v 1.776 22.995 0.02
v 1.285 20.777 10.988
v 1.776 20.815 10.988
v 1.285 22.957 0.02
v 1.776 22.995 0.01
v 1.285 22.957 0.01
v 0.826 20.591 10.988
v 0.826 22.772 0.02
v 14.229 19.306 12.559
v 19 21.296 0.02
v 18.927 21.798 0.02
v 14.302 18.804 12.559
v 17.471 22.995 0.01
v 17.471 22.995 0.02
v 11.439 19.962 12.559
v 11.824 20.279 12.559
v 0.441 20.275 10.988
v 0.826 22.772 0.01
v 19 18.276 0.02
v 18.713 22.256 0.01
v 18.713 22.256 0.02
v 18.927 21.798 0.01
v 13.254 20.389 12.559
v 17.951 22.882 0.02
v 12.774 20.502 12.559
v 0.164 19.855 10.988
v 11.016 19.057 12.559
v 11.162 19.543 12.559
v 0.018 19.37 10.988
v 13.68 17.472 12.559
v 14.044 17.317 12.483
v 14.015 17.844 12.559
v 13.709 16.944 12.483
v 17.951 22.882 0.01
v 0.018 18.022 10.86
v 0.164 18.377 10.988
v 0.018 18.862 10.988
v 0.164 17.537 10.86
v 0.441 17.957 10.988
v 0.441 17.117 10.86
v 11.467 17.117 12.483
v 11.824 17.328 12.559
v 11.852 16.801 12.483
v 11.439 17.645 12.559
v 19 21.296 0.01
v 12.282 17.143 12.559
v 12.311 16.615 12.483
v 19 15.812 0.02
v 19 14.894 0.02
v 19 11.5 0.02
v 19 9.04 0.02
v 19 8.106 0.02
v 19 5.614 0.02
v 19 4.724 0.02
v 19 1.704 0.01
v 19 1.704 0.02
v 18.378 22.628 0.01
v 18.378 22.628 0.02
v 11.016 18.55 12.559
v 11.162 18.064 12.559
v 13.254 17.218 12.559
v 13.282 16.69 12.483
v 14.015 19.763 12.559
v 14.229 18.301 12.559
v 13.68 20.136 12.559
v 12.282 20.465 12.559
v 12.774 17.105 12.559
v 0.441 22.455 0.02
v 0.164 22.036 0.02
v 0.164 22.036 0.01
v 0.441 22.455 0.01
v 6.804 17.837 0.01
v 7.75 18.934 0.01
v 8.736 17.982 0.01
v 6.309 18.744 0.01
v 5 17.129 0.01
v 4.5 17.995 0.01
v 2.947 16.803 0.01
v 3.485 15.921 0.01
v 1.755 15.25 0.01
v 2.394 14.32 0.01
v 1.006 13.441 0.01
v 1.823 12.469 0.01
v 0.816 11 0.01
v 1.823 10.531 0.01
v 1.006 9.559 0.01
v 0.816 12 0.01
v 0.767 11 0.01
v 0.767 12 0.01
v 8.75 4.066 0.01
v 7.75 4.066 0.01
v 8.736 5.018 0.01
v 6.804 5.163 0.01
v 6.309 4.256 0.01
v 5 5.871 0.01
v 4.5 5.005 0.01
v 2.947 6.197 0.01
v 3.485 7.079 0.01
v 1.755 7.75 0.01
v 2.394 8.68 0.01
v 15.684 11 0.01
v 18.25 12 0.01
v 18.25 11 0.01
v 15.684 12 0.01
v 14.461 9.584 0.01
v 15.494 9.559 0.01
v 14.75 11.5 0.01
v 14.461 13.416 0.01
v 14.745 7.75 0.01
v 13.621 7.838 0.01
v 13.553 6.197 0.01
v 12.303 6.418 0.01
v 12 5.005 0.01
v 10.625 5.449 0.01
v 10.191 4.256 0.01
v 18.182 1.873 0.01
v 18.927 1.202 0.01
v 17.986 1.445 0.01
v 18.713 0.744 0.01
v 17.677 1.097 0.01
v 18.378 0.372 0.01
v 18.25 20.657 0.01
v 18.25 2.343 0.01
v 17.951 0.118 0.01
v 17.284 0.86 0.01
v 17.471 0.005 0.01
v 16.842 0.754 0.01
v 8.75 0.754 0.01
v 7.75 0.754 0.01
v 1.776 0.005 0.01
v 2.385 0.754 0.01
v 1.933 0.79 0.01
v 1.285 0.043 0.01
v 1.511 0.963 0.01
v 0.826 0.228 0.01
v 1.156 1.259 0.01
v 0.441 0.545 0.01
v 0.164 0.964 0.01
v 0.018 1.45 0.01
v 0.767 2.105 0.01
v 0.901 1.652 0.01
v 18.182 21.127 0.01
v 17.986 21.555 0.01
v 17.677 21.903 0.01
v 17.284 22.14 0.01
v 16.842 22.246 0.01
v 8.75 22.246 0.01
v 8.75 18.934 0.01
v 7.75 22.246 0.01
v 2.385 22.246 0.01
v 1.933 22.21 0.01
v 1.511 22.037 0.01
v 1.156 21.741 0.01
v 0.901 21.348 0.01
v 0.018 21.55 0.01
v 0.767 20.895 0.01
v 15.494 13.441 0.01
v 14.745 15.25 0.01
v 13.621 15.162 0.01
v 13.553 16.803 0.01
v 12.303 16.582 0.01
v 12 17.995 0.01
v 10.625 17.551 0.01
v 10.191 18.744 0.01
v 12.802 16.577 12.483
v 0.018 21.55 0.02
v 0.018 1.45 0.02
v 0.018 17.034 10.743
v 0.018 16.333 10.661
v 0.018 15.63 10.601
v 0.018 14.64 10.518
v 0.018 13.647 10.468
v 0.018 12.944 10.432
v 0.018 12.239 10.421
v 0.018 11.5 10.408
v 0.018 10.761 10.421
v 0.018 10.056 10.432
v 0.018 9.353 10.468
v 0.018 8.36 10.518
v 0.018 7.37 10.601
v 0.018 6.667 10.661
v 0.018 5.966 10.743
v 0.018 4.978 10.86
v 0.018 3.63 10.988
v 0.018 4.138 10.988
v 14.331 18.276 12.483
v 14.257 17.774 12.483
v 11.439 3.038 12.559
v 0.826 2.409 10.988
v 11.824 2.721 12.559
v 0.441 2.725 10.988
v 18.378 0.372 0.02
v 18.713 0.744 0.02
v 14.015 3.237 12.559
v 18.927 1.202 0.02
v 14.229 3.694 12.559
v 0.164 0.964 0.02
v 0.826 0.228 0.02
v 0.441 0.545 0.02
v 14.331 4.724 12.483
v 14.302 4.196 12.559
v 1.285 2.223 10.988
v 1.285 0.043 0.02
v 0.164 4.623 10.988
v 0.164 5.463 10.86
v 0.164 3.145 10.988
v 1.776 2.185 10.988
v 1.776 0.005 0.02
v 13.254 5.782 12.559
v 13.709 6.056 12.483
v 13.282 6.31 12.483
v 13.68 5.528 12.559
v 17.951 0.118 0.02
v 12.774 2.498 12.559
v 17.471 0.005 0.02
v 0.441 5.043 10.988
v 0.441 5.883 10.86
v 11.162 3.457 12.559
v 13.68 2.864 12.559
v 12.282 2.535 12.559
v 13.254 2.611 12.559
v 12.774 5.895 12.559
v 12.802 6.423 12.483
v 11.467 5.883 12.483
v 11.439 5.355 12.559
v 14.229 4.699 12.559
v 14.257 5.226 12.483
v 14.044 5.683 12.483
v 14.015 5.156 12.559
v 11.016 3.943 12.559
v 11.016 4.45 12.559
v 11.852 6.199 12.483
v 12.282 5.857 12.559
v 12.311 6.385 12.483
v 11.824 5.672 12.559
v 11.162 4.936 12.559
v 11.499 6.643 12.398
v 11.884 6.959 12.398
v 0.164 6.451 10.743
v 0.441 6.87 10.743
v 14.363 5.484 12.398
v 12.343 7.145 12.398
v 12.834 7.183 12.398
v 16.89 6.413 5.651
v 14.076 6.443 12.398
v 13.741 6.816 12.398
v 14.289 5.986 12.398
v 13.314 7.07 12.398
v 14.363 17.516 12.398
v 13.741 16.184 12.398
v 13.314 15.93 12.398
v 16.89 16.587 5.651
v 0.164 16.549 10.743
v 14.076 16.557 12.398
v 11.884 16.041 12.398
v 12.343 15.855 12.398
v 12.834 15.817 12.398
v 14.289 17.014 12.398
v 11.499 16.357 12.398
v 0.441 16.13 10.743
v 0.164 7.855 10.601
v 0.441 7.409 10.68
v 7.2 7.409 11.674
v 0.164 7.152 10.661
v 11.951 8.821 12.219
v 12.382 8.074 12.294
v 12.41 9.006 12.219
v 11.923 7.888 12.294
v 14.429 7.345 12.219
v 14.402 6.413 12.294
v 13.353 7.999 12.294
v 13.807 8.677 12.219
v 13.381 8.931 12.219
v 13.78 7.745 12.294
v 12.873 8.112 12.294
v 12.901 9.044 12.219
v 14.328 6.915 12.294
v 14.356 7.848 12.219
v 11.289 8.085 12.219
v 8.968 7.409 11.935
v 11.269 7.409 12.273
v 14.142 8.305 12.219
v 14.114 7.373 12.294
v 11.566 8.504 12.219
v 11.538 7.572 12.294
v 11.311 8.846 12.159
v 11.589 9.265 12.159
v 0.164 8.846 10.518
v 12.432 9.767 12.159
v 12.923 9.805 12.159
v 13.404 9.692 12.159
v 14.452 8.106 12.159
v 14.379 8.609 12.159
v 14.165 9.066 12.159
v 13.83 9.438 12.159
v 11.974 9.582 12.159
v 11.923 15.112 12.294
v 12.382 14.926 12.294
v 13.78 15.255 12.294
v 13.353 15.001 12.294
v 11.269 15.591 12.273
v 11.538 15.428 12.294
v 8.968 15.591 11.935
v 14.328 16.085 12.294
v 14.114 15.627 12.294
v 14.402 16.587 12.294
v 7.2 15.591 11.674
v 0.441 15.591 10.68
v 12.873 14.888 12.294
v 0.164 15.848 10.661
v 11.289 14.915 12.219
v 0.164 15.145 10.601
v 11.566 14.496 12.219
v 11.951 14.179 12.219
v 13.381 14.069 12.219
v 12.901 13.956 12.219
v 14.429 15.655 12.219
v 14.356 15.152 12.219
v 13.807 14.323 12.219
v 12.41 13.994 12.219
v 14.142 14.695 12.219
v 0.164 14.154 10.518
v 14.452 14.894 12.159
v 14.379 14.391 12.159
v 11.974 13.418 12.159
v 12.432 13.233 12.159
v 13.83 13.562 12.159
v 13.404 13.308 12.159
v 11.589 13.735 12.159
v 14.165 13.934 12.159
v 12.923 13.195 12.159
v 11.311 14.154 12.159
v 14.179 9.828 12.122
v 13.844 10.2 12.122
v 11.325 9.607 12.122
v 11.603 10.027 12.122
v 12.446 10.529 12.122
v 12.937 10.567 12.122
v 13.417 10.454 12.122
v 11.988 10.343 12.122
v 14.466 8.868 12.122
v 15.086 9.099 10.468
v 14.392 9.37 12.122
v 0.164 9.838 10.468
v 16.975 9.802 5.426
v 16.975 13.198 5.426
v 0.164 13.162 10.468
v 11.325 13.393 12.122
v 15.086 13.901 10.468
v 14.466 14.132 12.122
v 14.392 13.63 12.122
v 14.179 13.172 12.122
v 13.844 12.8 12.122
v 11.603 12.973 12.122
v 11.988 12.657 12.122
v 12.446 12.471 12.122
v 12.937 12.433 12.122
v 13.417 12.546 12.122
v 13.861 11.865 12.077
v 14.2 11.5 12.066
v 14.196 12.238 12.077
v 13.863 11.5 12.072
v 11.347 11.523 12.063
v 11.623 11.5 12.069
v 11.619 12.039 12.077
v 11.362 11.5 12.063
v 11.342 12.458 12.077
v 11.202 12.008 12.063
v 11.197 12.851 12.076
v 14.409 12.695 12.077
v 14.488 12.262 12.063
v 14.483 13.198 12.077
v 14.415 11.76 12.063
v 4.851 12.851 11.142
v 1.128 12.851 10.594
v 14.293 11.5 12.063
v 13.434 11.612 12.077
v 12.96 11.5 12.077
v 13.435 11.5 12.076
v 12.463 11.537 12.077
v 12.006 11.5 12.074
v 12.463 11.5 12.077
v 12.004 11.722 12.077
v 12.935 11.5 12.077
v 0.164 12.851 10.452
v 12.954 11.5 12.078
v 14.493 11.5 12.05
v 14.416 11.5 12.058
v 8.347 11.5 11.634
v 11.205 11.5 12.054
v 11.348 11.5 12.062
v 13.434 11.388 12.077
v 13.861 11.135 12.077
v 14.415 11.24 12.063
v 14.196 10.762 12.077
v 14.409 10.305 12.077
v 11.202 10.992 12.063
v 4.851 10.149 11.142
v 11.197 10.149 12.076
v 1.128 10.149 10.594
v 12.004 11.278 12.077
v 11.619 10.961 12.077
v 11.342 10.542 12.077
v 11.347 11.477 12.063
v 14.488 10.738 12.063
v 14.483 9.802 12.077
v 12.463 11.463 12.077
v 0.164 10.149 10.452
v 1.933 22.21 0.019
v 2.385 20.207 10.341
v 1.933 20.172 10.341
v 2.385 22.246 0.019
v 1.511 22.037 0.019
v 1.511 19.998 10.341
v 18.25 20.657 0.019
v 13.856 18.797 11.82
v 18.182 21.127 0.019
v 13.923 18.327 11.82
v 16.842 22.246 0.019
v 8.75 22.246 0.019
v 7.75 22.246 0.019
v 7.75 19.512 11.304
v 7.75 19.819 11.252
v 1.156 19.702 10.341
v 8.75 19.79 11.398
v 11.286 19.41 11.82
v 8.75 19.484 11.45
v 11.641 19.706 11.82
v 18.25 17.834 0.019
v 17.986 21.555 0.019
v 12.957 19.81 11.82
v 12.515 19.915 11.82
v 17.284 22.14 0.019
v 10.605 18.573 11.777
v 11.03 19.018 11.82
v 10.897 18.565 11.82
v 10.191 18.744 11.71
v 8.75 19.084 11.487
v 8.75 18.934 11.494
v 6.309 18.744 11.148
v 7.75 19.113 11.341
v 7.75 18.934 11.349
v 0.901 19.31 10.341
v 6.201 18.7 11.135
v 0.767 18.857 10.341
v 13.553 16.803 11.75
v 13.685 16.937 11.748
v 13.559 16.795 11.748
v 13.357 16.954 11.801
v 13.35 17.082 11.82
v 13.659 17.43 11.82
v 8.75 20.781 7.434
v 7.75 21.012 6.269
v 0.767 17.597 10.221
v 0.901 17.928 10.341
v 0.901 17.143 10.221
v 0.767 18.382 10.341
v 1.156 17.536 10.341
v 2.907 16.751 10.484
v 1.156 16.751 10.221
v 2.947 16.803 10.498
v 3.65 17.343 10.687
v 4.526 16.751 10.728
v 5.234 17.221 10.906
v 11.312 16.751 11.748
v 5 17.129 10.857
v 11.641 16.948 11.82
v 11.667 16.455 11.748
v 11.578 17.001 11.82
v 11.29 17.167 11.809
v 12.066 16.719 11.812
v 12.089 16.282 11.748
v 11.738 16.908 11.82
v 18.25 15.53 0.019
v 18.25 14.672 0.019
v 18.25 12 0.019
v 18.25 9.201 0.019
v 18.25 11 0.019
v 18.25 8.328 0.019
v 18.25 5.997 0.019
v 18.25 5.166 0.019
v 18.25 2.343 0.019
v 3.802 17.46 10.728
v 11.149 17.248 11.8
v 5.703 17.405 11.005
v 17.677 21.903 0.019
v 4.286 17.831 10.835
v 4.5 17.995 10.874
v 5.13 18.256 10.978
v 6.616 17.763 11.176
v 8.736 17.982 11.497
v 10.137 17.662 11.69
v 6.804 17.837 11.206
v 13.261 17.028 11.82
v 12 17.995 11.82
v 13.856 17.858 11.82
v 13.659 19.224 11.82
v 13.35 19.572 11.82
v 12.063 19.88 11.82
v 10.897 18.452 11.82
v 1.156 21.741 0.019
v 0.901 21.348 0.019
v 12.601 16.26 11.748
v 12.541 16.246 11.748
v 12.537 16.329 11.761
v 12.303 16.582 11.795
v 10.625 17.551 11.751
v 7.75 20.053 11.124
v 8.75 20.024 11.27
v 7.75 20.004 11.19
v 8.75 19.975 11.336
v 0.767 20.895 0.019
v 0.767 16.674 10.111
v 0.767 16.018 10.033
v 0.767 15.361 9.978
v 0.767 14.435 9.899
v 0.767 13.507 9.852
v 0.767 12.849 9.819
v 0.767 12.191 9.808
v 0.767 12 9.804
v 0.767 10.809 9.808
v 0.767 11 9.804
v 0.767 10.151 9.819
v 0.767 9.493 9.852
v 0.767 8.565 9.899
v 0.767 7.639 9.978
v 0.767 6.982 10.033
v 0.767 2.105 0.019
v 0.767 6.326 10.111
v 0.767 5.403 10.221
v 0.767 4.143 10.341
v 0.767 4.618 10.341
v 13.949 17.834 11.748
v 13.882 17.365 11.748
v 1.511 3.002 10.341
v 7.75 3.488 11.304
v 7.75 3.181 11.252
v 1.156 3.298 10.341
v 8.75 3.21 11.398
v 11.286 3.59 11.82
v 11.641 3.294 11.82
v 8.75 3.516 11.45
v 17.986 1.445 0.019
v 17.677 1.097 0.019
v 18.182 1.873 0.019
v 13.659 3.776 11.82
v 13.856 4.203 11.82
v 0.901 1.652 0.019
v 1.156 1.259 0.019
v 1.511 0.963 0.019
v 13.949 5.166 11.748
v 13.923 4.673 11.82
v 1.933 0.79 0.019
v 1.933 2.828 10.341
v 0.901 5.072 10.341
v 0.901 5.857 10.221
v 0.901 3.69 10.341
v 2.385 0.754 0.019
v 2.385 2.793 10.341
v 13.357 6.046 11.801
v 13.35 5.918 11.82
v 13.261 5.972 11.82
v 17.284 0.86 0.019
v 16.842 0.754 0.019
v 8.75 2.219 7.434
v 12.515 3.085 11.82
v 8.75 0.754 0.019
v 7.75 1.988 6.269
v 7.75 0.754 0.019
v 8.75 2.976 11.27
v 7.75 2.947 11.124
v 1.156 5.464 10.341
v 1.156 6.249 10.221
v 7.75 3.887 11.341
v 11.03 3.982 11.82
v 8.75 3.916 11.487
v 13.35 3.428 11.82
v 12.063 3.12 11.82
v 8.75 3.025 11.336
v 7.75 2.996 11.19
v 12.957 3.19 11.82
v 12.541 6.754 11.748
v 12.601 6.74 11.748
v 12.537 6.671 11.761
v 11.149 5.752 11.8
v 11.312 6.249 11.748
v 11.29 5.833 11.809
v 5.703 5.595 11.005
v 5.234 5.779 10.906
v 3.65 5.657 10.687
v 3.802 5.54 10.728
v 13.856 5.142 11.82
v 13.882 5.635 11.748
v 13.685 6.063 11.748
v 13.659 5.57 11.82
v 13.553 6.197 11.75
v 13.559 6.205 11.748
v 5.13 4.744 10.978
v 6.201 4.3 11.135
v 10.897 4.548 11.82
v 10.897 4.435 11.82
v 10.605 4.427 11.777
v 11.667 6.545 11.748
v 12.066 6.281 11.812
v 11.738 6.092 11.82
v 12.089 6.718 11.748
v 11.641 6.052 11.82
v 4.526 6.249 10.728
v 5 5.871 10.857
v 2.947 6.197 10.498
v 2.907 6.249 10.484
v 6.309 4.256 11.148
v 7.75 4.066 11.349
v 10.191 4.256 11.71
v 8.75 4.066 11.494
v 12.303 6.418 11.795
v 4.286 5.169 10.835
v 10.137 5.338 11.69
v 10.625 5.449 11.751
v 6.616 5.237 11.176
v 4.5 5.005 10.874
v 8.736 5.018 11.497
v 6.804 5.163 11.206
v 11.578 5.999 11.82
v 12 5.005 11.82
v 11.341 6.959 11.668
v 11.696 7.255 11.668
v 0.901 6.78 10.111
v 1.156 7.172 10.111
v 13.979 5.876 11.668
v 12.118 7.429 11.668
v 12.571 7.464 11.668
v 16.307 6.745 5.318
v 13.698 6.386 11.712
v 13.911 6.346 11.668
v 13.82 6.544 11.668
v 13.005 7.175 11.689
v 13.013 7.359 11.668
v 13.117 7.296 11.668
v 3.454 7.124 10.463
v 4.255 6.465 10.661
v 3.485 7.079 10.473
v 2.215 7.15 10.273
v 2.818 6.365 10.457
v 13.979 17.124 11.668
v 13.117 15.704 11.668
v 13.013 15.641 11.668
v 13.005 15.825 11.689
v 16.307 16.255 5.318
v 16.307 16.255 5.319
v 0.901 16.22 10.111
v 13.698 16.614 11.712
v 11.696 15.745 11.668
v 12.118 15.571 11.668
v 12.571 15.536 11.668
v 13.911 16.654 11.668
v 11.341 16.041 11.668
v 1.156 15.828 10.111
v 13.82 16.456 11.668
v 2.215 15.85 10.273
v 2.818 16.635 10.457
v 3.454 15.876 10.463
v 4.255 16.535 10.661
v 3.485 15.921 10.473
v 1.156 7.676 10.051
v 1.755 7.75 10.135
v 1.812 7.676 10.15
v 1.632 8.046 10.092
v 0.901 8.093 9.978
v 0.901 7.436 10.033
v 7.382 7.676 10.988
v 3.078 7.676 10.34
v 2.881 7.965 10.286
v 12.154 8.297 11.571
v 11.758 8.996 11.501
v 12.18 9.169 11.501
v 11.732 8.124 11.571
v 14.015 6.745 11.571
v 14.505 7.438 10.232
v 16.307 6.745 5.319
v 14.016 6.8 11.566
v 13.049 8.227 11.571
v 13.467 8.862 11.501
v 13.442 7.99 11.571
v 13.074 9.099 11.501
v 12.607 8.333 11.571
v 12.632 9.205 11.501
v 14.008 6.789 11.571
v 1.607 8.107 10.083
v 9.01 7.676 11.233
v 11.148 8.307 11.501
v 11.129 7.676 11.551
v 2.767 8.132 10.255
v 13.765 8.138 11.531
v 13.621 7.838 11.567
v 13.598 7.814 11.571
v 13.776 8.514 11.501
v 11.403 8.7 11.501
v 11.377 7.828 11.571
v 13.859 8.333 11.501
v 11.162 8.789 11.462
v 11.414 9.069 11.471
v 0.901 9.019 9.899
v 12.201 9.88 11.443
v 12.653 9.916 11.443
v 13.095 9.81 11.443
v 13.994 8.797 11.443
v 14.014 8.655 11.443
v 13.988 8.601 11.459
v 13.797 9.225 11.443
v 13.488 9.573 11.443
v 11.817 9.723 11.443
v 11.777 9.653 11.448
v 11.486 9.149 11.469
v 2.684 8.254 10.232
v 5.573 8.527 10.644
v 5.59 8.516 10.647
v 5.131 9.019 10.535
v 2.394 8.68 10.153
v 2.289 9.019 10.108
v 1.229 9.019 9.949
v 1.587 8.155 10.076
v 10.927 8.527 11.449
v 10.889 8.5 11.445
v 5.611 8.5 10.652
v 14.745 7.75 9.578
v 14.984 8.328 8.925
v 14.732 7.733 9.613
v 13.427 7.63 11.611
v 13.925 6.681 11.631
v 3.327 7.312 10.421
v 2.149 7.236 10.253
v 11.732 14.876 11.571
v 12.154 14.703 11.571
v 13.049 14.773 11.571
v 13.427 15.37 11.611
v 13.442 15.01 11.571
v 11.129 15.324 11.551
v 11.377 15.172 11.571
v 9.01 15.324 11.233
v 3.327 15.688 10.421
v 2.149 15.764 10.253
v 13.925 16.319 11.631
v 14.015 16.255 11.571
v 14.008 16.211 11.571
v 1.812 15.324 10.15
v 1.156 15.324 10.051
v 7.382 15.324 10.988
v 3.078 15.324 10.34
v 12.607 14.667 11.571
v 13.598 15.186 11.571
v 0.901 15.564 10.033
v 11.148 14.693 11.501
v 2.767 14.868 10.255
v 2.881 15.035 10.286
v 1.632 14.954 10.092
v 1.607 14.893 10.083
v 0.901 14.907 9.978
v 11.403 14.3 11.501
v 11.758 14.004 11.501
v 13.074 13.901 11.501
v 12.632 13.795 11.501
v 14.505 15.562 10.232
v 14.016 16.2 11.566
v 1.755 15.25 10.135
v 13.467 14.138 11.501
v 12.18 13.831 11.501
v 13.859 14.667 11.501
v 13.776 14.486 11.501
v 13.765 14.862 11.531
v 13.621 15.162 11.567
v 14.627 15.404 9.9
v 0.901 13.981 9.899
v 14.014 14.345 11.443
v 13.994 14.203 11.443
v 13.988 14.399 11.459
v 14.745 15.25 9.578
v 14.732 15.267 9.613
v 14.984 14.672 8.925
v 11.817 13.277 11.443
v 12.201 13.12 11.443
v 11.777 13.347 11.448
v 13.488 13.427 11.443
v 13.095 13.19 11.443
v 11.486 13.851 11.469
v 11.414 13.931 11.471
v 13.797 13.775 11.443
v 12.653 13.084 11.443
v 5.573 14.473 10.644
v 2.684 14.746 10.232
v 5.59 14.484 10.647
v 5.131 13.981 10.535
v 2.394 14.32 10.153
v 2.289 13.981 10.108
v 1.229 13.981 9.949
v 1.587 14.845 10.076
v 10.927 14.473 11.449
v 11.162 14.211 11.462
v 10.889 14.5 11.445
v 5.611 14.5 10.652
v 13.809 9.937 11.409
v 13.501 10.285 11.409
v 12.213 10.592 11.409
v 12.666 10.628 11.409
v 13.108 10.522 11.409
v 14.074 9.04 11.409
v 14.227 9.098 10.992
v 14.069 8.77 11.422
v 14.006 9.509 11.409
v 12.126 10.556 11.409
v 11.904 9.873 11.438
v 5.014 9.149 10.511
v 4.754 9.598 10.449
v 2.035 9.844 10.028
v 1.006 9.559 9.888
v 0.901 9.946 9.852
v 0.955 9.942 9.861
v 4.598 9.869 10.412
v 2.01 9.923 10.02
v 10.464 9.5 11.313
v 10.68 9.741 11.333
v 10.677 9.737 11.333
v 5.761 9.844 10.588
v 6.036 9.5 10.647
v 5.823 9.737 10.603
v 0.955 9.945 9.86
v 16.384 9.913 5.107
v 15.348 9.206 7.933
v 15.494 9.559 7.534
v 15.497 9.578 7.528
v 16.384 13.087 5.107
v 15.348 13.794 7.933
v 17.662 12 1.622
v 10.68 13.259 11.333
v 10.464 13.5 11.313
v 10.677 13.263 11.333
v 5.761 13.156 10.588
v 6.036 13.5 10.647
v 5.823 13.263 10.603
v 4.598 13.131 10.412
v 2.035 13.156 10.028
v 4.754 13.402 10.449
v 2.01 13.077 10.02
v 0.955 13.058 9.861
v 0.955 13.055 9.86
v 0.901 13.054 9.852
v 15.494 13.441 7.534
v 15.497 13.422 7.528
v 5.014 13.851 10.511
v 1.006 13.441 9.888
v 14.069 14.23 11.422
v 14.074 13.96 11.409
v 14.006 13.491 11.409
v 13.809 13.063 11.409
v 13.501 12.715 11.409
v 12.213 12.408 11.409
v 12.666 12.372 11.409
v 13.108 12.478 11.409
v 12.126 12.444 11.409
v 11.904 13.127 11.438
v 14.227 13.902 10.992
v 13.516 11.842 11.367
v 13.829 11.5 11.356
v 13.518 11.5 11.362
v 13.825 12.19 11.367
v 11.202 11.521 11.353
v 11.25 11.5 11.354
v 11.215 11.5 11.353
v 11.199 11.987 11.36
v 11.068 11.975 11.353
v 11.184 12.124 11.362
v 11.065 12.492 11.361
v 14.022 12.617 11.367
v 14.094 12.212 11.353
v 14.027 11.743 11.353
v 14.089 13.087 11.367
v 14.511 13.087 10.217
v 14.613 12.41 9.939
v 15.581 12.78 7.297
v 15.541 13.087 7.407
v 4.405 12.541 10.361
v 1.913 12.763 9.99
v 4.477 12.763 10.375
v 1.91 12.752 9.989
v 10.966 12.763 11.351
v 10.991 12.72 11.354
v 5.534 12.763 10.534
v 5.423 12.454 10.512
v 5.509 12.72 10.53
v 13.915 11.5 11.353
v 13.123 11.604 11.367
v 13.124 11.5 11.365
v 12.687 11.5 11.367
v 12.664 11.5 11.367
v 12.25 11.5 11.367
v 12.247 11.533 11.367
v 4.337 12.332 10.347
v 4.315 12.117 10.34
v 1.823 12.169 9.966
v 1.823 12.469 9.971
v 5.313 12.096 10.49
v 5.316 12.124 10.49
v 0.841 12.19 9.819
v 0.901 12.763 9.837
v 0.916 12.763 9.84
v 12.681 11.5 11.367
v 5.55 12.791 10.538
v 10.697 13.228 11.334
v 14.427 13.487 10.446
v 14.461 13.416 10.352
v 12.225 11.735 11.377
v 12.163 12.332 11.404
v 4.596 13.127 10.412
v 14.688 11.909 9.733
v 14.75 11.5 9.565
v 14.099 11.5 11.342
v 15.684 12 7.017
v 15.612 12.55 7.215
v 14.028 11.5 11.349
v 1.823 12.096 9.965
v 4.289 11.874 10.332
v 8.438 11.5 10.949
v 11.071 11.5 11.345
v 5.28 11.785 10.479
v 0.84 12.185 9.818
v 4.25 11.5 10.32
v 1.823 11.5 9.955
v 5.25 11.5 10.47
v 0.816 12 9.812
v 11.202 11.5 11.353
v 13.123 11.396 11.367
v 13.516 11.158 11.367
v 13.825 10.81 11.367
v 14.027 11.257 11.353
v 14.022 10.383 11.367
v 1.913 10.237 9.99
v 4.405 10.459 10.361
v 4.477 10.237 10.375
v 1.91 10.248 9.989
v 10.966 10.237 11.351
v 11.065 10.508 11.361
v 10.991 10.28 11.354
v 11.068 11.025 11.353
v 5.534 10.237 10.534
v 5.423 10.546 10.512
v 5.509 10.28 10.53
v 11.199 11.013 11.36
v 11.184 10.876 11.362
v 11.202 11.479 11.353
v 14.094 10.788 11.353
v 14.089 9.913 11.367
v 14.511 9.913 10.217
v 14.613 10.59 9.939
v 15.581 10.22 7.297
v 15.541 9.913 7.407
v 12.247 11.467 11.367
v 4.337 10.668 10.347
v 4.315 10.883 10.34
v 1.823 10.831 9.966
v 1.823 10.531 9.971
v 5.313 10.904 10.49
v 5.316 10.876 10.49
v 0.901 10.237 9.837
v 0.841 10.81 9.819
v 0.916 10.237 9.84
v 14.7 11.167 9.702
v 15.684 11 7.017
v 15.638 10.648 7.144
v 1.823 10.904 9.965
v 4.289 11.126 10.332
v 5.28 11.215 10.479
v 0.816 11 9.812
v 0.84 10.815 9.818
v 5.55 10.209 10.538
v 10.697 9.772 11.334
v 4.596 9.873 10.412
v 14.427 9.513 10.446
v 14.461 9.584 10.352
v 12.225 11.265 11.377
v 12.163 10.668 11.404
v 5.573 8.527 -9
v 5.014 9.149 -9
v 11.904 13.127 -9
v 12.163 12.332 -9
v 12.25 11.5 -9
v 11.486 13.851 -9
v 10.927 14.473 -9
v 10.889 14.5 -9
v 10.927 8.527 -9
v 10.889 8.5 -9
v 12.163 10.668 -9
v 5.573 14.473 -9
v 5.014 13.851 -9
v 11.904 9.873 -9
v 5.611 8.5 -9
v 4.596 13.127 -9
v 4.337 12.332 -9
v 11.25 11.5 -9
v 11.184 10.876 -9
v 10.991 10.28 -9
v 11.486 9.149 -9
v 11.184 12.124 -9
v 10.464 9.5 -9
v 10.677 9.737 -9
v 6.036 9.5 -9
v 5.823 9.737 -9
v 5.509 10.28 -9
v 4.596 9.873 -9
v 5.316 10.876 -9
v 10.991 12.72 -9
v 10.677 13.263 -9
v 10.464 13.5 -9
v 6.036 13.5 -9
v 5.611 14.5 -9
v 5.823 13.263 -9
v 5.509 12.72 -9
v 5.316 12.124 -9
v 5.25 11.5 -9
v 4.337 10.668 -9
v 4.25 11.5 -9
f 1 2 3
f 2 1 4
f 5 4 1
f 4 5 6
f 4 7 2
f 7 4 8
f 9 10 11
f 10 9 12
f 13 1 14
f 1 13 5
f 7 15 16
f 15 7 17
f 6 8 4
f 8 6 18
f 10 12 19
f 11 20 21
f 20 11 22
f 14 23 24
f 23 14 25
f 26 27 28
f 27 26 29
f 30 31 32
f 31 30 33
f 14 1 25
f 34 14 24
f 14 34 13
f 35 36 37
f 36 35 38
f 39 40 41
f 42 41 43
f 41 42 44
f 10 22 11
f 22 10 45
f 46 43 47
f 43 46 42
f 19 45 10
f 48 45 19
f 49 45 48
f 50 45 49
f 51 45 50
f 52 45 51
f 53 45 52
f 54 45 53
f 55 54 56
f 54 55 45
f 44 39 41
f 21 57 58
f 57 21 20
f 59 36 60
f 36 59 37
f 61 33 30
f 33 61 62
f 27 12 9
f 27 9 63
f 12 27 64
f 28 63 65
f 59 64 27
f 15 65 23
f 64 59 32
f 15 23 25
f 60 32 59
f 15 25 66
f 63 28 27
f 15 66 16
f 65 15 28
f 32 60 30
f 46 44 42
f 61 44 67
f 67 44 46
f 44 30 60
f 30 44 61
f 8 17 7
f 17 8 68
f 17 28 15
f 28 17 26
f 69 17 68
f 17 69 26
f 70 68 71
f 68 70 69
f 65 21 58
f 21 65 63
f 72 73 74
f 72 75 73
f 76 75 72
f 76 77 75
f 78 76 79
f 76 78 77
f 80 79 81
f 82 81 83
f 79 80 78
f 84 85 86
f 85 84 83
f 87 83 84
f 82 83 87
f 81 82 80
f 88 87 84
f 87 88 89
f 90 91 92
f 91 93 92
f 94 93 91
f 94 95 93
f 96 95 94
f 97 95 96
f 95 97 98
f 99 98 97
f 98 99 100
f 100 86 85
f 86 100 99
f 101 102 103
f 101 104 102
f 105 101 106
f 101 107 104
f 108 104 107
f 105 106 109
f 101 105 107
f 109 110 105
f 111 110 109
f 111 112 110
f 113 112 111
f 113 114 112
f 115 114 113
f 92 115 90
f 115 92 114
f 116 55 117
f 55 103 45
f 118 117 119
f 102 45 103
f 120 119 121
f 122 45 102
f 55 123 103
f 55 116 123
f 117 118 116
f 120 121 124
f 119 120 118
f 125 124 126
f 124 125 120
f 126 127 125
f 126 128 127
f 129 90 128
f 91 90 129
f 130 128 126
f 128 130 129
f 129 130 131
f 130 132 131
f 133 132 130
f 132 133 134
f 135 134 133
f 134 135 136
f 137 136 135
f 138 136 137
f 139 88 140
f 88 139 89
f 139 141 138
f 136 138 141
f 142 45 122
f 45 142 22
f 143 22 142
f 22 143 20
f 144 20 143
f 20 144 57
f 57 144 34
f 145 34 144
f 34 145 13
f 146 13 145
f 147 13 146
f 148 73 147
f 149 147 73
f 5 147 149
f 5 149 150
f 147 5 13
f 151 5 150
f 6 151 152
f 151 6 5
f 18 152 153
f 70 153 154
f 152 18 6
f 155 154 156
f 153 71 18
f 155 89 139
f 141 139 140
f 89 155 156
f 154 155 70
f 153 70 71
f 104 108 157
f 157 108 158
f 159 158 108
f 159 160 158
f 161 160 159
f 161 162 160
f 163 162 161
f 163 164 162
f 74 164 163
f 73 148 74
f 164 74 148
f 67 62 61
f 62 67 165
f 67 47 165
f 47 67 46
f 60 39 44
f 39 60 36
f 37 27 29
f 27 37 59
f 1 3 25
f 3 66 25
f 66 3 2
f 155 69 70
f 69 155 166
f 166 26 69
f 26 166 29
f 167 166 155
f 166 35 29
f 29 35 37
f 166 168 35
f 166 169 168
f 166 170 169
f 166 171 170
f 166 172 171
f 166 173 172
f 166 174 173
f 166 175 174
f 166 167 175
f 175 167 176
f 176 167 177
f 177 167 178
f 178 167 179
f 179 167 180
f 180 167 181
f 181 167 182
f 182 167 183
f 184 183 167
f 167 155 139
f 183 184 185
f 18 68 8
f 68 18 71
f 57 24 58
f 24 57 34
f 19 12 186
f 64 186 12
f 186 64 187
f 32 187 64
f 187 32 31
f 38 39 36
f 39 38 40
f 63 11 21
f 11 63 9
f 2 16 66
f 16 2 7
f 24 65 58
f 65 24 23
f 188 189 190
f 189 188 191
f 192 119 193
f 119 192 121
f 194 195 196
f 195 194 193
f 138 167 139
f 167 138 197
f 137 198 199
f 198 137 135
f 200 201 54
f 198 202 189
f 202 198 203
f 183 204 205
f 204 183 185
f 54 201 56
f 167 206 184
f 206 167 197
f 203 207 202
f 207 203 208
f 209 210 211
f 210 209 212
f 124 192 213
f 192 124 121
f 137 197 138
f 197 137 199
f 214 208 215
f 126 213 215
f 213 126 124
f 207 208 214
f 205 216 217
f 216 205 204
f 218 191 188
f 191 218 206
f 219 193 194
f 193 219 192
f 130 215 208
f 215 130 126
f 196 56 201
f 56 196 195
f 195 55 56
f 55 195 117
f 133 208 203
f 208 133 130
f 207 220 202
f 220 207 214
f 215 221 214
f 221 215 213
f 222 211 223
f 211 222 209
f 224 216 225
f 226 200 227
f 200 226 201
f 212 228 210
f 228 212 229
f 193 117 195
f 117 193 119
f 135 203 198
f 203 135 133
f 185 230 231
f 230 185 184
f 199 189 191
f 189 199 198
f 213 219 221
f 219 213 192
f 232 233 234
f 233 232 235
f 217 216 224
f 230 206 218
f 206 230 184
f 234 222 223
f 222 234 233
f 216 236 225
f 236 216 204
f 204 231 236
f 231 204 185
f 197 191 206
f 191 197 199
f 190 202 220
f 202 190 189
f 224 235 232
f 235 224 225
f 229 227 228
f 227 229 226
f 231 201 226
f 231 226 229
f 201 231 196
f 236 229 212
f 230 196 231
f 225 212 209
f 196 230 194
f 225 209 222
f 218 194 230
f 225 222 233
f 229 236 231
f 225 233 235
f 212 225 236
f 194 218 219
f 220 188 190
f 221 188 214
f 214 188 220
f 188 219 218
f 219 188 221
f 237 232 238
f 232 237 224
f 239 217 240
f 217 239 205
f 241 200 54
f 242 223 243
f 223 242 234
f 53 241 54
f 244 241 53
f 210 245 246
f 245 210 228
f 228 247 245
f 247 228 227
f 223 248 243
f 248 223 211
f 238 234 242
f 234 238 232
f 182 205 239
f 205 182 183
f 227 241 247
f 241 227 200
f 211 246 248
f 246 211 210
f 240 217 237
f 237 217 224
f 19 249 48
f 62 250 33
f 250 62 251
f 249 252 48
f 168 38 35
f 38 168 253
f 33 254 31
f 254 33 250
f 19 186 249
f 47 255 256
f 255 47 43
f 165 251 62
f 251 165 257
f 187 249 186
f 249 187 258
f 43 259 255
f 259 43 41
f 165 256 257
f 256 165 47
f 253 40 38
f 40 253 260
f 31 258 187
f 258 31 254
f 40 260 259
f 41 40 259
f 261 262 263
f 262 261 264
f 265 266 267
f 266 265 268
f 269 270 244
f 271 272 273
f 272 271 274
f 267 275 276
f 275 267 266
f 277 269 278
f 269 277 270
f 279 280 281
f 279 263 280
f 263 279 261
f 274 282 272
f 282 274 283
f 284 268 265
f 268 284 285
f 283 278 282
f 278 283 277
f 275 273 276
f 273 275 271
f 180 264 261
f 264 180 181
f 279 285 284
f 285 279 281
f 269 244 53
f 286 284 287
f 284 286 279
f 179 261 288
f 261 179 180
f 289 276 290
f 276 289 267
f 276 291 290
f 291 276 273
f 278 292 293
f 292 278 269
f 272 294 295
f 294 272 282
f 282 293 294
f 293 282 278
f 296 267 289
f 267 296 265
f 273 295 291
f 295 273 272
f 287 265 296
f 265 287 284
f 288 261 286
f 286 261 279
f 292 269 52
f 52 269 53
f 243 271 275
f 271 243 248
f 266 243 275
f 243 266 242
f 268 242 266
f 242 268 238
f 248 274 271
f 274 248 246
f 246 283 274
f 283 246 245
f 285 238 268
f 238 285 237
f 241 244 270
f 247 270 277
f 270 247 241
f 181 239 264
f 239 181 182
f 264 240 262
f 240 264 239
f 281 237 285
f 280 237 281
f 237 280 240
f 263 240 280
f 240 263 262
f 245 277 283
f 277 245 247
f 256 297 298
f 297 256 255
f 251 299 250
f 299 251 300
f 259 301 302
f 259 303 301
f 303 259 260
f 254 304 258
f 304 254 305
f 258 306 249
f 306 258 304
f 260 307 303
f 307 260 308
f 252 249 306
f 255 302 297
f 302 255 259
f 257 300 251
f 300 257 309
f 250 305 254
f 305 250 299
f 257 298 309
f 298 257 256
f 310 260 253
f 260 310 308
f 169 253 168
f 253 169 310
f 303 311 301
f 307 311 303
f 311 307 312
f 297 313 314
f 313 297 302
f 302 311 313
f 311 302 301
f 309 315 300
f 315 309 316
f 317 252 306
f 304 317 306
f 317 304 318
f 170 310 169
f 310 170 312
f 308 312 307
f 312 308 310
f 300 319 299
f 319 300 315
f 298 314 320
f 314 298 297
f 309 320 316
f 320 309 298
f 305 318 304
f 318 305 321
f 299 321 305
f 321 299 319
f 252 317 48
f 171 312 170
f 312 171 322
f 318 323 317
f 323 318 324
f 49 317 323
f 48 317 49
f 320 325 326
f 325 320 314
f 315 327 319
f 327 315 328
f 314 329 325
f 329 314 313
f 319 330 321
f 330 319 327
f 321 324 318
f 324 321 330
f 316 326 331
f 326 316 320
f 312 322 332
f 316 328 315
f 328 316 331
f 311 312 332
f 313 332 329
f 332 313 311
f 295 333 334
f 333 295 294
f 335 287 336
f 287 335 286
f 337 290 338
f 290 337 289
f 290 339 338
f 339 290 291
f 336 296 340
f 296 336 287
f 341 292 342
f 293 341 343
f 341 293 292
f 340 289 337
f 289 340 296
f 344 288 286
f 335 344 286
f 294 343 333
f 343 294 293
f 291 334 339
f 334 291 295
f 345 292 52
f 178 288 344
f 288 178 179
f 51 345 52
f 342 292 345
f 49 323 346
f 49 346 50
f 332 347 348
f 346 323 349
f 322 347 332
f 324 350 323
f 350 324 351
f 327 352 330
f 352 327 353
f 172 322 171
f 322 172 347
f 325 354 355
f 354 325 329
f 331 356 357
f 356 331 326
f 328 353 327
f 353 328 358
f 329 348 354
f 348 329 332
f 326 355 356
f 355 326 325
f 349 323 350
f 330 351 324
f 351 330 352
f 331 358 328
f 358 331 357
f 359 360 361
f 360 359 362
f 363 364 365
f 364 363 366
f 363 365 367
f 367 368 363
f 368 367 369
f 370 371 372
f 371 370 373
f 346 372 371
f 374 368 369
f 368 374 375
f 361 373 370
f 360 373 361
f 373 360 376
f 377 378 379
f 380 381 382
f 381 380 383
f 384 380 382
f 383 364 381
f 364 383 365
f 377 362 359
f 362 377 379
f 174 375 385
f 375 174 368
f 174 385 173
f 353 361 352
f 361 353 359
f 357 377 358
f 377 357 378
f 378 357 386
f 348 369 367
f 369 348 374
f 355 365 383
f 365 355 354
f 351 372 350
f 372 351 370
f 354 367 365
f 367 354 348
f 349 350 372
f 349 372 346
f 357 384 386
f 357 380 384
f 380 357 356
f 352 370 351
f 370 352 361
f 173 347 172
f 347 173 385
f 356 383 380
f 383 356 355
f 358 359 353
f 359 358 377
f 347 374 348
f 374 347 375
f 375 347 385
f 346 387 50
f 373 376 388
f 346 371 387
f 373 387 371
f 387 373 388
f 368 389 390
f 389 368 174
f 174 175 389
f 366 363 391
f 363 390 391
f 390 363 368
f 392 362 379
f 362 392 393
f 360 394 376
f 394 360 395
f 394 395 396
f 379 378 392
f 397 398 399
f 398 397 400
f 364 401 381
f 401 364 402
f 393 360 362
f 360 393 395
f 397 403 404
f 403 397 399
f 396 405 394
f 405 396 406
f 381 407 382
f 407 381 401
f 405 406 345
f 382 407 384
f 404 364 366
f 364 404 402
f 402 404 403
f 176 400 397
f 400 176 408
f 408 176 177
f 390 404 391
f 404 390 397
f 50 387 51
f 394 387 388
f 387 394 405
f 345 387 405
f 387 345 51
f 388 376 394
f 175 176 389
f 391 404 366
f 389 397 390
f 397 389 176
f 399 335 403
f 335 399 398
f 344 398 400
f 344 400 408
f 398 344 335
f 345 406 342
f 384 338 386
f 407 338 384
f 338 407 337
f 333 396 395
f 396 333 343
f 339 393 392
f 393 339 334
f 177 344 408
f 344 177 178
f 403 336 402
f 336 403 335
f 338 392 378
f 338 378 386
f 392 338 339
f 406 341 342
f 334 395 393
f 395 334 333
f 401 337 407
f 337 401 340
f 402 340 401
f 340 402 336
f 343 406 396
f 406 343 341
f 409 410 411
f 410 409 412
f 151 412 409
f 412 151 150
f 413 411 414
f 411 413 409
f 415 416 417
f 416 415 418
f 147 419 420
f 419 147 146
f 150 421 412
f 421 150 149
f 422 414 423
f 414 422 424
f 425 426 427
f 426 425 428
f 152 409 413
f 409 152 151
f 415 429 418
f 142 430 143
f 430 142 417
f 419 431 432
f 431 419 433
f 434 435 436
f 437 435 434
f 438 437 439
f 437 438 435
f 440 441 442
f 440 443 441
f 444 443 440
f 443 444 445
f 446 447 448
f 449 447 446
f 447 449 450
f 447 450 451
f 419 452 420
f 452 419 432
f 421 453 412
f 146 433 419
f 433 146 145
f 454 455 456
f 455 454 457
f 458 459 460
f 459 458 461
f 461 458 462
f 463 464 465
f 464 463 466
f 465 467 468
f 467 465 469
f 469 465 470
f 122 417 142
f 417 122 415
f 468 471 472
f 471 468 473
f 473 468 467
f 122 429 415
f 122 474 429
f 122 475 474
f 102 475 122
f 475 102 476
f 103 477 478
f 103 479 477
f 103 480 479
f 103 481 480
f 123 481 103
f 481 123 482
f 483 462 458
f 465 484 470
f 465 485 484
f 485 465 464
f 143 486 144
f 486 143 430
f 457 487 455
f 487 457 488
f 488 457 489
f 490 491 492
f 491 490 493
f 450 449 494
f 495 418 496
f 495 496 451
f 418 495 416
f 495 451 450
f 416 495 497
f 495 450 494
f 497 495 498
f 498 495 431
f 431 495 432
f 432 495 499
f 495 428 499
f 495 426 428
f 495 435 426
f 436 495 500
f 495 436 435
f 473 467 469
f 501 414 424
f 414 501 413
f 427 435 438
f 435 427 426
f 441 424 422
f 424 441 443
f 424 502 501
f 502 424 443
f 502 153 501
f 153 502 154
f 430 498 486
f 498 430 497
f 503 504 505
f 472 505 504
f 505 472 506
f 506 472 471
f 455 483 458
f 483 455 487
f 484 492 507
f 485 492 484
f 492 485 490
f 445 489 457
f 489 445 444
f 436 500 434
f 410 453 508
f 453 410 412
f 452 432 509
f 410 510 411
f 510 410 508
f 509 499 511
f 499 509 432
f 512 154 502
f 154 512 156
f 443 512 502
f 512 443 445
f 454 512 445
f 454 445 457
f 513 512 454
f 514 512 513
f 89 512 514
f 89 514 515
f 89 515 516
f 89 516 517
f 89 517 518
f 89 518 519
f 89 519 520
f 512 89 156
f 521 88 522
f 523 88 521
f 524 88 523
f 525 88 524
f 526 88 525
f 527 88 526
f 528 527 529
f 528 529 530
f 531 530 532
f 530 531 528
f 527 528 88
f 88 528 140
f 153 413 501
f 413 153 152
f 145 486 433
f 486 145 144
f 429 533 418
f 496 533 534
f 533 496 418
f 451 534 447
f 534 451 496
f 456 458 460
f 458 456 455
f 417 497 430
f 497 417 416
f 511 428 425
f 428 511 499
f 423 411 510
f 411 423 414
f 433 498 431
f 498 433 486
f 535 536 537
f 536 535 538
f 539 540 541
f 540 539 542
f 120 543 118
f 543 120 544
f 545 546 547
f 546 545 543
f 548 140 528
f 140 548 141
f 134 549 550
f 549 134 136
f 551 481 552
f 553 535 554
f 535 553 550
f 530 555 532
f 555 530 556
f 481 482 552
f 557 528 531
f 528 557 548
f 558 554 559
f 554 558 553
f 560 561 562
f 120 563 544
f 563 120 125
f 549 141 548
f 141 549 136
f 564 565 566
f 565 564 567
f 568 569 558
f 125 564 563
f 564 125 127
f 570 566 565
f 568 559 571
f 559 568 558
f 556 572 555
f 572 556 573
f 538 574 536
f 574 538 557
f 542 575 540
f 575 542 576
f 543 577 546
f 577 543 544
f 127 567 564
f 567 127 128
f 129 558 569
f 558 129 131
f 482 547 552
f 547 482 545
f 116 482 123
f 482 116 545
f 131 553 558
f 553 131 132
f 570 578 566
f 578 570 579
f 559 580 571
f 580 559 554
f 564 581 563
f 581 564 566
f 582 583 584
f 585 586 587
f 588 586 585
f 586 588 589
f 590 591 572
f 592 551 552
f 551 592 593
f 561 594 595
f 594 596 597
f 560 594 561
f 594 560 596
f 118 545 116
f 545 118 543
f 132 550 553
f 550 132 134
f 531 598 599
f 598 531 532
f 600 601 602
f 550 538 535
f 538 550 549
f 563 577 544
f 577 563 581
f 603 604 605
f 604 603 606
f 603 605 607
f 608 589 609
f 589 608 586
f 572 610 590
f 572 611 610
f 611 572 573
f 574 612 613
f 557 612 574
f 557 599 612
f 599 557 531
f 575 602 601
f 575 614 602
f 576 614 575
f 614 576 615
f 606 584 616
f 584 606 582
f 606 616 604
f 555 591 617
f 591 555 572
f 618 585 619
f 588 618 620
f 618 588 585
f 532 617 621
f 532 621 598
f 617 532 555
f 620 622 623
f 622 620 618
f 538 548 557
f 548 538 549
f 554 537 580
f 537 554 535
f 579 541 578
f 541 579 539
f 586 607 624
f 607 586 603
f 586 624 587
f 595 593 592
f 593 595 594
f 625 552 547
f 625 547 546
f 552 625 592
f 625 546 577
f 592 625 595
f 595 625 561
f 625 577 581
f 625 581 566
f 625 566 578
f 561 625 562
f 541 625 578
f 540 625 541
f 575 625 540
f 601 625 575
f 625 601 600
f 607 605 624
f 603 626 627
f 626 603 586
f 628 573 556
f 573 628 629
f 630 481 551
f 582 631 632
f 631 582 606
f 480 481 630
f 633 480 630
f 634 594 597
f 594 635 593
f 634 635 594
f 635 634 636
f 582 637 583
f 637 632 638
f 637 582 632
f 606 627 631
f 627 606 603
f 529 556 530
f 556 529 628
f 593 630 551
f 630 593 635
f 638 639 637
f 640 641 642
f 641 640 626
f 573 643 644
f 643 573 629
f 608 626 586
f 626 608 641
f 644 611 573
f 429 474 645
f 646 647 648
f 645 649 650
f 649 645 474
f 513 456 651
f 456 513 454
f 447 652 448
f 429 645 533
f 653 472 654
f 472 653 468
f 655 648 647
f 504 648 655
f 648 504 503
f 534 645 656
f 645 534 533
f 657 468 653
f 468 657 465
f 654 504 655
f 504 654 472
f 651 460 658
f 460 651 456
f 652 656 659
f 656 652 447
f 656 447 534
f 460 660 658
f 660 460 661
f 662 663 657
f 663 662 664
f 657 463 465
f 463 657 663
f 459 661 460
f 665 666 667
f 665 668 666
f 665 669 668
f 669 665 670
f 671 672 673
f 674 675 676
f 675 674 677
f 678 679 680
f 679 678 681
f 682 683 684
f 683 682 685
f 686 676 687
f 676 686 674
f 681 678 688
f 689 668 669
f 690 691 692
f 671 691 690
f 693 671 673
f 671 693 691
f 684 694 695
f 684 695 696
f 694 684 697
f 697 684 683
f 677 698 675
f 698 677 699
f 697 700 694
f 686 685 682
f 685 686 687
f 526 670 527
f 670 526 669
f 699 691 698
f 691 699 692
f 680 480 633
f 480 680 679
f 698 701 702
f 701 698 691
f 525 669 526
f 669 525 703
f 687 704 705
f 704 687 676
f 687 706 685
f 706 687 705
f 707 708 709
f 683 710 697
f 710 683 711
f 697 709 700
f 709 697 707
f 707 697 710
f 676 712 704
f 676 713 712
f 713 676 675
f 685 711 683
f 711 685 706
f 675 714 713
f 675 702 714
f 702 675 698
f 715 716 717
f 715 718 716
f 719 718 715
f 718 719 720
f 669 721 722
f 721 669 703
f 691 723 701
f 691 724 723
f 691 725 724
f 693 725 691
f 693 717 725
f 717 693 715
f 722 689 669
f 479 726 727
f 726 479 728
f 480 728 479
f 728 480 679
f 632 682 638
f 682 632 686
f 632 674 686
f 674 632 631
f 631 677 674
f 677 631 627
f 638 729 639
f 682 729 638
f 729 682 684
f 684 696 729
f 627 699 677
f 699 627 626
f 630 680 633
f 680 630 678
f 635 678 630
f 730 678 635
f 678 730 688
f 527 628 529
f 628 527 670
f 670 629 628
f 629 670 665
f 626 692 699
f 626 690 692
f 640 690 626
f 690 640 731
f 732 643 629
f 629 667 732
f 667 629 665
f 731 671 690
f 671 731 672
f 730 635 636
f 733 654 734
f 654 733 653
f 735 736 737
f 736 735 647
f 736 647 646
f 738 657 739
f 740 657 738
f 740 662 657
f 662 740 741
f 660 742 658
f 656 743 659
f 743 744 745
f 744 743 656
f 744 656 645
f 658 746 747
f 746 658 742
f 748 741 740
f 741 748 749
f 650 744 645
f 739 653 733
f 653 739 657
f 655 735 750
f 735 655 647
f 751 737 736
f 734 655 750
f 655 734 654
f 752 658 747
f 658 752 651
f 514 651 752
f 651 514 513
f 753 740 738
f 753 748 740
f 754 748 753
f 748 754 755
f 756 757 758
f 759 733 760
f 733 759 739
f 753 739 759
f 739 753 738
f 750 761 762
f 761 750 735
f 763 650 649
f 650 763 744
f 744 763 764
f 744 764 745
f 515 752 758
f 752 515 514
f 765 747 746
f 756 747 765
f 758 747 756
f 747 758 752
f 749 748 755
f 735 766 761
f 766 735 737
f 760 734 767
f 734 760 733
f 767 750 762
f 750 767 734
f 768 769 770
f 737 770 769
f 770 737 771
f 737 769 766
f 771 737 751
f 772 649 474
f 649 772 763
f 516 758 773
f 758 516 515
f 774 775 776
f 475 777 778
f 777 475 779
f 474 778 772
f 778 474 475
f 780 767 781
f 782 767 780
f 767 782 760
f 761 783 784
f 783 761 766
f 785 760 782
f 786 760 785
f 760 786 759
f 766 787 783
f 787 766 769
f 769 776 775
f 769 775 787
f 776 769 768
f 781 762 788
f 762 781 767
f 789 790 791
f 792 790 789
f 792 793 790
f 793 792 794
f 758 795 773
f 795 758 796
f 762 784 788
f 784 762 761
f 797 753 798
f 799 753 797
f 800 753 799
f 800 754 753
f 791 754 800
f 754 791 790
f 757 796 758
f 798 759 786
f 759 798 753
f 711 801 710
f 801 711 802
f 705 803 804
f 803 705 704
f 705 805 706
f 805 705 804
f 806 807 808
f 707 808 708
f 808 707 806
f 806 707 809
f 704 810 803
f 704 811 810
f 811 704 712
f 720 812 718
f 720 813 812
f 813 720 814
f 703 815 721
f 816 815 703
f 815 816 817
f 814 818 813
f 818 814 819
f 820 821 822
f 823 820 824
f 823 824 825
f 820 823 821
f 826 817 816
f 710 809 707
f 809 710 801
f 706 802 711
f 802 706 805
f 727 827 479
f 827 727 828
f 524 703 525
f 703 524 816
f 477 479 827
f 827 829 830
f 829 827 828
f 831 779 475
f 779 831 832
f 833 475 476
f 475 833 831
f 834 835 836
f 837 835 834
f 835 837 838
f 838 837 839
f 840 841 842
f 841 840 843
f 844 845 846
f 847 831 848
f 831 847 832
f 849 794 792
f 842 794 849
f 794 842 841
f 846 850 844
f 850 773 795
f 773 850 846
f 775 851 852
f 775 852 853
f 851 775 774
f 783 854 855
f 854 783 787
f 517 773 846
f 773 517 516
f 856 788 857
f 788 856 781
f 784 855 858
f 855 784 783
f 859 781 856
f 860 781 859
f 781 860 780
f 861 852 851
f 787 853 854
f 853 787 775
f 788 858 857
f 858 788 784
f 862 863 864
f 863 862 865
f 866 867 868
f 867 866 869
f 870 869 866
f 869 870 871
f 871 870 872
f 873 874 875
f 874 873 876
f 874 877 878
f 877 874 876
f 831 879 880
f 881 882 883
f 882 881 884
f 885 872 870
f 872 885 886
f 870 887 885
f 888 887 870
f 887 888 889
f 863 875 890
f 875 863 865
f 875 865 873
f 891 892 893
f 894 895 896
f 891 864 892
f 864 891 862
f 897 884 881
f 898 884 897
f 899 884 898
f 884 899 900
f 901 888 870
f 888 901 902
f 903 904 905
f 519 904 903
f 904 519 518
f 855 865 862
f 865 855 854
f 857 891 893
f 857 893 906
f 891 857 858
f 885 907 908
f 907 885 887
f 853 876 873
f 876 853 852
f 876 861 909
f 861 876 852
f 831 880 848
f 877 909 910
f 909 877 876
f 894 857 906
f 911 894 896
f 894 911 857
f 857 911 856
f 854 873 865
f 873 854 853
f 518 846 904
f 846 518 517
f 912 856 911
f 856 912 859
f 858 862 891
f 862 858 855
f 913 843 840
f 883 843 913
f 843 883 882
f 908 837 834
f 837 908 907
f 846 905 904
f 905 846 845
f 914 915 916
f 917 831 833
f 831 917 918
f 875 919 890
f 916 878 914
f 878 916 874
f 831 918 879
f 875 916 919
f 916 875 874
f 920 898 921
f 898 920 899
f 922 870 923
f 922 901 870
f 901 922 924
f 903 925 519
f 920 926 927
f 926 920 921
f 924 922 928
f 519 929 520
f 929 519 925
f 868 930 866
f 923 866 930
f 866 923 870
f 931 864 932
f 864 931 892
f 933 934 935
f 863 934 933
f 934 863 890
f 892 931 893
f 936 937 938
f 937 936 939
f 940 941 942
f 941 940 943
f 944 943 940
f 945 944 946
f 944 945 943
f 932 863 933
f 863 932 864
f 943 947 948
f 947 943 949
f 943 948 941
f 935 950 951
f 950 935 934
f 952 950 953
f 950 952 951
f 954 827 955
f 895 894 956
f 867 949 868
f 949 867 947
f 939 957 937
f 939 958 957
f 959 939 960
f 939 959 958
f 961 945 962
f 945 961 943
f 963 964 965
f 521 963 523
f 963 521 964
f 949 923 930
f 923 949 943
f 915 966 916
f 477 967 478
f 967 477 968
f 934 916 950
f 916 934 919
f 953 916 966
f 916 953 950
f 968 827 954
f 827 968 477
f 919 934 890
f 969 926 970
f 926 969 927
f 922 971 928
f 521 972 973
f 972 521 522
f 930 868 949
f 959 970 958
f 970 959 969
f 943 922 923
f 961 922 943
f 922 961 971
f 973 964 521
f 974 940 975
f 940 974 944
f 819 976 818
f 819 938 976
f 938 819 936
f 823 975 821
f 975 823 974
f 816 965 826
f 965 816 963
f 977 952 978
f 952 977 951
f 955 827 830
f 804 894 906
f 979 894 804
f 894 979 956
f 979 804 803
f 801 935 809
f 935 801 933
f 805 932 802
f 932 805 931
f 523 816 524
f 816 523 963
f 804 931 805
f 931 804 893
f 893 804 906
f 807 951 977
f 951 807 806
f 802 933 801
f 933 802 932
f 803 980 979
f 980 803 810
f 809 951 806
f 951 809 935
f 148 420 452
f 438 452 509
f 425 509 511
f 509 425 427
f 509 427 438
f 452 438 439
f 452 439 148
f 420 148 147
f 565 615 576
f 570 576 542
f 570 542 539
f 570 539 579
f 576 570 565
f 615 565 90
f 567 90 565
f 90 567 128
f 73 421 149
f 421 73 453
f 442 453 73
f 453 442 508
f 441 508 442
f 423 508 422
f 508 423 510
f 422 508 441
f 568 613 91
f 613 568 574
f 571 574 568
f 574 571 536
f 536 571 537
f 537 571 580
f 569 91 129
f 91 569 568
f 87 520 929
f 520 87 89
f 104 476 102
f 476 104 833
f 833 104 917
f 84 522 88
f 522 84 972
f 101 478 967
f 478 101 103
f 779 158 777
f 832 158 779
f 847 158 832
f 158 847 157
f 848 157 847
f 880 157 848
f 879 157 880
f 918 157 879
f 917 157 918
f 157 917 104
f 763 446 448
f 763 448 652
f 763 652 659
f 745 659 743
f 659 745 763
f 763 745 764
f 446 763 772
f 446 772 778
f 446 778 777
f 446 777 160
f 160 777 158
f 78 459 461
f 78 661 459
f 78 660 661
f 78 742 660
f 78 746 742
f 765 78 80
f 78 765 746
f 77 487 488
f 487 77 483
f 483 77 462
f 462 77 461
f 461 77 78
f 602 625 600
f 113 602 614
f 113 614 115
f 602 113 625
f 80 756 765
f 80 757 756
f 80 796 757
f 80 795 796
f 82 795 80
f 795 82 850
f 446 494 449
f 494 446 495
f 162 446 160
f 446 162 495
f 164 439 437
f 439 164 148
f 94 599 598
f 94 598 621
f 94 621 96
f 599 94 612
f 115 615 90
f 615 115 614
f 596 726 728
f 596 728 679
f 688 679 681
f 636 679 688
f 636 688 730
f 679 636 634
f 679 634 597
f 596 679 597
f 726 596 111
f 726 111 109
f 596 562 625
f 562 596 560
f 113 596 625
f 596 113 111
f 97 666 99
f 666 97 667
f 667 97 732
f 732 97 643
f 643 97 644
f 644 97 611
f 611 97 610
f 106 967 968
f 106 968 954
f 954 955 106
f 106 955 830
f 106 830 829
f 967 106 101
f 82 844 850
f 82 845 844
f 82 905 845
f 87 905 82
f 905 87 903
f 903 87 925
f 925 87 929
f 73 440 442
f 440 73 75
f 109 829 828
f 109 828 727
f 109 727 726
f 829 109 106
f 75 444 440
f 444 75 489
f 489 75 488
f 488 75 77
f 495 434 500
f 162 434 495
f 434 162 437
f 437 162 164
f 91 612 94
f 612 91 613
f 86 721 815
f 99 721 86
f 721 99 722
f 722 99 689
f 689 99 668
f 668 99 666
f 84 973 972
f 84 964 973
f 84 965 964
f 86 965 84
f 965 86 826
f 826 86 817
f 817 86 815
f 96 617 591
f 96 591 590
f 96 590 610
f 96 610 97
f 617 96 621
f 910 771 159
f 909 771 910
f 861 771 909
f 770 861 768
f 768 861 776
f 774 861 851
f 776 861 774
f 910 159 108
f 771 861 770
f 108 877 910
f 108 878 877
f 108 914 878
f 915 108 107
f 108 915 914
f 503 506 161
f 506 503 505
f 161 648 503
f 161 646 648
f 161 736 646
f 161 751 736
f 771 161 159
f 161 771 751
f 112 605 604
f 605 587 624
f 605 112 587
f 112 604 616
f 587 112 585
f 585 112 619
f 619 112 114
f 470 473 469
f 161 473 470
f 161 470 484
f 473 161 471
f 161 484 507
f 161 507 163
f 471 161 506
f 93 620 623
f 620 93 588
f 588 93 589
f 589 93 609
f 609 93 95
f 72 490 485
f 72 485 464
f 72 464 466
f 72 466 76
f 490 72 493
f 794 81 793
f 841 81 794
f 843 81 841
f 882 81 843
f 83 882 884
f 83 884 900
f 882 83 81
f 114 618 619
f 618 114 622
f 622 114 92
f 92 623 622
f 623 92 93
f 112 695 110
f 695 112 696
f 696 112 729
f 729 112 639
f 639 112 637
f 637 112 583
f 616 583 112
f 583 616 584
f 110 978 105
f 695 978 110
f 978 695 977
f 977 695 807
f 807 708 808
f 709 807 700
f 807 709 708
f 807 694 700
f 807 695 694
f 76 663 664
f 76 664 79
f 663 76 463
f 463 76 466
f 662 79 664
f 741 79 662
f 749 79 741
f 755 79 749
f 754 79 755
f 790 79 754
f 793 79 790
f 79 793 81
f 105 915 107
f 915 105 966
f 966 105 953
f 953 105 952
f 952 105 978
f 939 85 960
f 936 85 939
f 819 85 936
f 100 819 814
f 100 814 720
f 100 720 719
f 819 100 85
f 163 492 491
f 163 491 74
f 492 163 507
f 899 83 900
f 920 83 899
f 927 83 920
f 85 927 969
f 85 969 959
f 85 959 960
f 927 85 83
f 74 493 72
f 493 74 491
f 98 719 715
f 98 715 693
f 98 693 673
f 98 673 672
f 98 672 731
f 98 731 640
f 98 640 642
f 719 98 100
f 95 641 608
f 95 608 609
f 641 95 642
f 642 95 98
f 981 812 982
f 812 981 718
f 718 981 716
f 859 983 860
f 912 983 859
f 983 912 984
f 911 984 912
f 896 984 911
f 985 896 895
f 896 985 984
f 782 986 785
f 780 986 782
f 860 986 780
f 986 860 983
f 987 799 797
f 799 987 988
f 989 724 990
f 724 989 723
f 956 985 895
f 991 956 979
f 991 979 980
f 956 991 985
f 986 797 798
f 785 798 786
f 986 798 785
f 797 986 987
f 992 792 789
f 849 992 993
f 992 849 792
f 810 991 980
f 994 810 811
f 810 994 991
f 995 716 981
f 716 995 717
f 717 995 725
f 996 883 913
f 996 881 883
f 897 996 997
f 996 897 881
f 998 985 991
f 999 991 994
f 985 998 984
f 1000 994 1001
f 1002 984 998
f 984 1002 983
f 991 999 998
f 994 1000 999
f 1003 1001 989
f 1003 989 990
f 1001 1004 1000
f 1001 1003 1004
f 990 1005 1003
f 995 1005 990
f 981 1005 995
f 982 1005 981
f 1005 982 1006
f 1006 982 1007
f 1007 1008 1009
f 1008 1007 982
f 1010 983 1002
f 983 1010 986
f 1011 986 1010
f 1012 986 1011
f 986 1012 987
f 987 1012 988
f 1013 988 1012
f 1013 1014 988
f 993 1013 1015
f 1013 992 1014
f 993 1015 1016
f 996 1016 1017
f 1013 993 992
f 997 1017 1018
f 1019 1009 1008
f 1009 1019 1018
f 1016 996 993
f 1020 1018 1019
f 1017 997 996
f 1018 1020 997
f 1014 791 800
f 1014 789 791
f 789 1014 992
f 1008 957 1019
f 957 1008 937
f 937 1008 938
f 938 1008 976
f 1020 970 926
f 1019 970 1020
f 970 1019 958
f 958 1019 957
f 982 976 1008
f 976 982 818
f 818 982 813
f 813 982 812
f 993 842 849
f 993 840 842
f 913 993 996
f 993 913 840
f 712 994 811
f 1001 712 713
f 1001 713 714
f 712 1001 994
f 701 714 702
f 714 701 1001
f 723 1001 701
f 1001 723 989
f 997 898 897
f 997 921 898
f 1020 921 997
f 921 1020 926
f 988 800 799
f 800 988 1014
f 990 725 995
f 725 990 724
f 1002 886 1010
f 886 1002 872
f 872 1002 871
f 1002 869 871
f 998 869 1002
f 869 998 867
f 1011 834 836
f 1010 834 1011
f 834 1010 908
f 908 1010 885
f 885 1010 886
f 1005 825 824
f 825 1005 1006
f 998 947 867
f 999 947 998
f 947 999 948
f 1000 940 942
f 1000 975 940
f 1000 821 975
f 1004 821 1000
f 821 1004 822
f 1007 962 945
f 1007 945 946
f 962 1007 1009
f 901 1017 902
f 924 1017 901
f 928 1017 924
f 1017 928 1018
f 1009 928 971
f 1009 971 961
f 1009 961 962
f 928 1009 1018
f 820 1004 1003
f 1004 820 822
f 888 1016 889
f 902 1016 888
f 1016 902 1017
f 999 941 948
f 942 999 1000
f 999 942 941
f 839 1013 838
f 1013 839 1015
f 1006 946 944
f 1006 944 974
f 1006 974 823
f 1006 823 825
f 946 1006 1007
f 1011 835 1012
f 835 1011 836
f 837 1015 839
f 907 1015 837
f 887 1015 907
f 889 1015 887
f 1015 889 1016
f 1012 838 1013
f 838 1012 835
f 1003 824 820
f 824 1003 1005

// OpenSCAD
//measures are in millimeters
AY=23.0;
AX=19.0;
BY=18.0;
BLX=14.5;
EZ=11.0;
FLZ=14.0;
H=12.75;
CYL_OFF_Z=70;
CYL_DEPTH=0.1;
CLIP_X=2;
CLIP_Y=0.75;
CLIP_H=3*CLIP_Y;
CORNER_RADIUS=2;
INNER_GUARD_RADIUS=6.5;
OUTER_GUARD_RADIUS=7.5;
SHAFT_X=8.0;
SHAFT_Y=6.0;
WallThickness=0.75;
ClipWidth=2.2;
ClipDepth=0.75;

//ascfront=FLZ/sqrt(pow(FLZ,2)-pow(H,2));
//asctop=(H-EZ)/sqrt(pow(BLX,2)-pow((H-EZ),2));

alpha=asin((H-EZ)/BLX);
beta=asin(H/FLZ);
gamma=90-asin((0.5*(AY-BY))/EZ);

module keycap(){
	scale([AX/(AX+2*CORNER_RADIUS),AY/(AY+2*CORNER_RADIUS),1])
	translate([CORNER_RADIUS,CORNER_RADIUS,0.01])
	minkowski(){
		difference(){
			cube([AX,AY,H]);
			rotate(a=gamma,v=[1,0,0]) cube([100,100,100]);
			translate([0,AY,0]) rotate(a=90-gamma,v=[1,0,0]) cube([100,100,100]);
			translate([0,0,EZ]) rotate(a=-alpha,v=[0,1,0]) translate([-50,0,0]) cube([100,100,100]);
			translate([0,AY/2,EZ+CYL_OFF_Z]) rotate(a=90-alpha,v=[0,1,0]) cylinder(h=100,center=true,r=CYL_OFF_Z+CYL_DEPTH,$fa=1);
			translate([AX,0,0]) rotate(a=beta-90,v=[0,1,0]) cube([100,100,100]);
		}
		cylinder(h=0.01,r=CORNER_RADIUS,$fs=0.6);
		//rotate(a=90,v=[1,0,0]) cylinder(h=0.01,r=1,$fs=0.3);
	}
}

module blind_shaft(){

}

module shaft(){
	translate([0,0,-9]) difference(){
		intersection(){
			cylinder(h=100,r=SHAFT_X/2,$fs=0.3);
			translate([-SHAFT_X/2,-SHAFT_Y/2,0]) cube([SHAFT_X,SHAFT_Y,100]);
		}
		intersection(){
			cylinder(h=100,r=SHAFT_X/2-1,$fs=0.3);
			translate([-SHAFT_X/2+1,-SHAFT_Y/2+1,0]) cube([SHAFT_X-2,SHAFT_Y-2,100]);
		}
	}
}

module guard(){
	difference(){
		union(){
			cube([1,100,100],center=true);
			cube([100,1,100],center=true);
			cylinder(r=OUTER_GUARD_RADIUS,h=100);
		}
		cylinder(r=INNER_GUARD_RADIUS,h=100);
	}
}

difference(){
	keycap();
	difference(){
		translate([WallThickness, WallThickness, 0]) scale(v=[1-2*WallThickness/AX, 1-2*WallThickness/AY, 1-WallThickness/H]) keycap();
		translate([OUTER_GUARD_RADIUS+WallThickness,AY/2]) guard();
	}
}
intersection(){
	union(){
		translate([WallThickness, WallThickness, 0]) scale(v=[1-2*WallThickness/AX, 1-2*WallThickness/AY, 1-WallThickness/H]) keycap();
		translate([-50,-50,-99.9]) cube([100,100,100]);
	}
	translate([OUTER_GUARD_RADIUS+WallThickness,AY/2]) union(){
		shaft();
	}
}
